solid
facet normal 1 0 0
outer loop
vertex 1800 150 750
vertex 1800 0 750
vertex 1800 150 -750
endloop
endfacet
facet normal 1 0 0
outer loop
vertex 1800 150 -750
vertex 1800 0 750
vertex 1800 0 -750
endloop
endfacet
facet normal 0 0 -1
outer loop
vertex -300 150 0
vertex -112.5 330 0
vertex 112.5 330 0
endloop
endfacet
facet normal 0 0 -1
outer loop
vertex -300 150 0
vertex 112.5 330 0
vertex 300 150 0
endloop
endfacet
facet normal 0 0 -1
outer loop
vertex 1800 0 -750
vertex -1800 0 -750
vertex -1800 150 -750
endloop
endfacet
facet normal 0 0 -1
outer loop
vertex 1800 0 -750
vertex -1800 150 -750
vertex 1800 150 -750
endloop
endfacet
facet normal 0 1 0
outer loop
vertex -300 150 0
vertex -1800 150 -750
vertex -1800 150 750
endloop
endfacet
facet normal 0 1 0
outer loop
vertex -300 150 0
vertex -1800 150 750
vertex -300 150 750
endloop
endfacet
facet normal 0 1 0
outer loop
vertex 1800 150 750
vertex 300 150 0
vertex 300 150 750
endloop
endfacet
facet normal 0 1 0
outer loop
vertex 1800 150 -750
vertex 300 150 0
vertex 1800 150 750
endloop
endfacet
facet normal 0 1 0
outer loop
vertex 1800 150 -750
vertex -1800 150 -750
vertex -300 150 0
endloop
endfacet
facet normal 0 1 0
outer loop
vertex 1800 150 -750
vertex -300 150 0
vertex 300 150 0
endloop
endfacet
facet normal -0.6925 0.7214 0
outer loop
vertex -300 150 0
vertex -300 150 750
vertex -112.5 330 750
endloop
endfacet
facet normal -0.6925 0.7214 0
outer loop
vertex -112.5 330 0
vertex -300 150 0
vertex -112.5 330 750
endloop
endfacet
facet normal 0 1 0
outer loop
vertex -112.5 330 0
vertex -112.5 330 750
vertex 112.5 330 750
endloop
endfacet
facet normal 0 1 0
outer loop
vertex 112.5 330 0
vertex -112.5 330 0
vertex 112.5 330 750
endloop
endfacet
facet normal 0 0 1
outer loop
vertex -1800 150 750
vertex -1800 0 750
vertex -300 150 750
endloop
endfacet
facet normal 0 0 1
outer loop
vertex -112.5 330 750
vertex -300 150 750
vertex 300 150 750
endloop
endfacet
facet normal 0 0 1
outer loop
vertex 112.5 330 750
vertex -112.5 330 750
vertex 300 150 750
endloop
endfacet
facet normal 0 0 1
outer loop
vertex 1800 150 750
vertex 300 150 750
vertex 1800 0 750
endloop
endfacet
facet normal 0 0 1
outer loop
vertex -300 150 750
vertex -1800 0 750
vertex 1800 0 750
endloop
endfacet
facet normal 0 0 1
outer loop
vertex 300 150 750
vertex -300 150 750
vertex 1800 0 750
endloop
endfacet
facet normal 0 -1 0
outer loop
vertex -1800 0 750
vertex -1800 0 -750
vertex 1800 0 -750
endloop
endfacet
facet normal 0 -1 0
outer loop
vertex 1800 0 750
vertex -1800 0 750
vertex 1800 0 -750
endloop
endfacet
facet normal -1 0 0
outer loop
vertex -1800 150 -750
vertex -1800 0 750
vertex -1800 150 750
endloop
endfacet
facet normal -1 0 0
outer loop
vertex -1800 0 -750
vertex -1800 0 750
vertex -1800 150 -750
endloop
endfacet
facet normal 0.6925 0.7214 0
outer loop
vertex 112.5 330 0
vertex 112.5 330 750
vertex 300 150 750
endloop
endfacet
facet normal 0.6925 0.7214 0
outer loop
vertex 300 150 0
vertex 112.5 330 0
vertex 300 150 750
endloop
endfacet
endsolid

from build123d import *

# Parameters (mm, degrees)
SKETCH1_W           = 3600
SKETCH1_H           = 1500
BOSS_EXTRUDE1_DEPTH = 150
BOSS_EXTRUDE2_DEPTH = 750


with BuildPart() as part:
    # Sketch1 → Boss-Extrude1 (new body)
    with BuildSketch(Plane(origin=(0, 0, 0), x_dir=(1, 0, 0), z_dir=(0, 1, 0))):
        Rectangle(SKETCH1_W, SKETCH1_H)
    extrude(amount=BOSS_EXTRUDE1_DEPTH)

    # Sketch3 → Boss-Extrude2 (add)
    with BuildSketch(Plane.XY.offset(750)):
        Polygon((300, 150), (-300, 150), (-112.5, 330), (112.5, 330), align=None)
    extrude(amount=-BOSS_EXTRUDE2_DEPTH)


solid = part.part
